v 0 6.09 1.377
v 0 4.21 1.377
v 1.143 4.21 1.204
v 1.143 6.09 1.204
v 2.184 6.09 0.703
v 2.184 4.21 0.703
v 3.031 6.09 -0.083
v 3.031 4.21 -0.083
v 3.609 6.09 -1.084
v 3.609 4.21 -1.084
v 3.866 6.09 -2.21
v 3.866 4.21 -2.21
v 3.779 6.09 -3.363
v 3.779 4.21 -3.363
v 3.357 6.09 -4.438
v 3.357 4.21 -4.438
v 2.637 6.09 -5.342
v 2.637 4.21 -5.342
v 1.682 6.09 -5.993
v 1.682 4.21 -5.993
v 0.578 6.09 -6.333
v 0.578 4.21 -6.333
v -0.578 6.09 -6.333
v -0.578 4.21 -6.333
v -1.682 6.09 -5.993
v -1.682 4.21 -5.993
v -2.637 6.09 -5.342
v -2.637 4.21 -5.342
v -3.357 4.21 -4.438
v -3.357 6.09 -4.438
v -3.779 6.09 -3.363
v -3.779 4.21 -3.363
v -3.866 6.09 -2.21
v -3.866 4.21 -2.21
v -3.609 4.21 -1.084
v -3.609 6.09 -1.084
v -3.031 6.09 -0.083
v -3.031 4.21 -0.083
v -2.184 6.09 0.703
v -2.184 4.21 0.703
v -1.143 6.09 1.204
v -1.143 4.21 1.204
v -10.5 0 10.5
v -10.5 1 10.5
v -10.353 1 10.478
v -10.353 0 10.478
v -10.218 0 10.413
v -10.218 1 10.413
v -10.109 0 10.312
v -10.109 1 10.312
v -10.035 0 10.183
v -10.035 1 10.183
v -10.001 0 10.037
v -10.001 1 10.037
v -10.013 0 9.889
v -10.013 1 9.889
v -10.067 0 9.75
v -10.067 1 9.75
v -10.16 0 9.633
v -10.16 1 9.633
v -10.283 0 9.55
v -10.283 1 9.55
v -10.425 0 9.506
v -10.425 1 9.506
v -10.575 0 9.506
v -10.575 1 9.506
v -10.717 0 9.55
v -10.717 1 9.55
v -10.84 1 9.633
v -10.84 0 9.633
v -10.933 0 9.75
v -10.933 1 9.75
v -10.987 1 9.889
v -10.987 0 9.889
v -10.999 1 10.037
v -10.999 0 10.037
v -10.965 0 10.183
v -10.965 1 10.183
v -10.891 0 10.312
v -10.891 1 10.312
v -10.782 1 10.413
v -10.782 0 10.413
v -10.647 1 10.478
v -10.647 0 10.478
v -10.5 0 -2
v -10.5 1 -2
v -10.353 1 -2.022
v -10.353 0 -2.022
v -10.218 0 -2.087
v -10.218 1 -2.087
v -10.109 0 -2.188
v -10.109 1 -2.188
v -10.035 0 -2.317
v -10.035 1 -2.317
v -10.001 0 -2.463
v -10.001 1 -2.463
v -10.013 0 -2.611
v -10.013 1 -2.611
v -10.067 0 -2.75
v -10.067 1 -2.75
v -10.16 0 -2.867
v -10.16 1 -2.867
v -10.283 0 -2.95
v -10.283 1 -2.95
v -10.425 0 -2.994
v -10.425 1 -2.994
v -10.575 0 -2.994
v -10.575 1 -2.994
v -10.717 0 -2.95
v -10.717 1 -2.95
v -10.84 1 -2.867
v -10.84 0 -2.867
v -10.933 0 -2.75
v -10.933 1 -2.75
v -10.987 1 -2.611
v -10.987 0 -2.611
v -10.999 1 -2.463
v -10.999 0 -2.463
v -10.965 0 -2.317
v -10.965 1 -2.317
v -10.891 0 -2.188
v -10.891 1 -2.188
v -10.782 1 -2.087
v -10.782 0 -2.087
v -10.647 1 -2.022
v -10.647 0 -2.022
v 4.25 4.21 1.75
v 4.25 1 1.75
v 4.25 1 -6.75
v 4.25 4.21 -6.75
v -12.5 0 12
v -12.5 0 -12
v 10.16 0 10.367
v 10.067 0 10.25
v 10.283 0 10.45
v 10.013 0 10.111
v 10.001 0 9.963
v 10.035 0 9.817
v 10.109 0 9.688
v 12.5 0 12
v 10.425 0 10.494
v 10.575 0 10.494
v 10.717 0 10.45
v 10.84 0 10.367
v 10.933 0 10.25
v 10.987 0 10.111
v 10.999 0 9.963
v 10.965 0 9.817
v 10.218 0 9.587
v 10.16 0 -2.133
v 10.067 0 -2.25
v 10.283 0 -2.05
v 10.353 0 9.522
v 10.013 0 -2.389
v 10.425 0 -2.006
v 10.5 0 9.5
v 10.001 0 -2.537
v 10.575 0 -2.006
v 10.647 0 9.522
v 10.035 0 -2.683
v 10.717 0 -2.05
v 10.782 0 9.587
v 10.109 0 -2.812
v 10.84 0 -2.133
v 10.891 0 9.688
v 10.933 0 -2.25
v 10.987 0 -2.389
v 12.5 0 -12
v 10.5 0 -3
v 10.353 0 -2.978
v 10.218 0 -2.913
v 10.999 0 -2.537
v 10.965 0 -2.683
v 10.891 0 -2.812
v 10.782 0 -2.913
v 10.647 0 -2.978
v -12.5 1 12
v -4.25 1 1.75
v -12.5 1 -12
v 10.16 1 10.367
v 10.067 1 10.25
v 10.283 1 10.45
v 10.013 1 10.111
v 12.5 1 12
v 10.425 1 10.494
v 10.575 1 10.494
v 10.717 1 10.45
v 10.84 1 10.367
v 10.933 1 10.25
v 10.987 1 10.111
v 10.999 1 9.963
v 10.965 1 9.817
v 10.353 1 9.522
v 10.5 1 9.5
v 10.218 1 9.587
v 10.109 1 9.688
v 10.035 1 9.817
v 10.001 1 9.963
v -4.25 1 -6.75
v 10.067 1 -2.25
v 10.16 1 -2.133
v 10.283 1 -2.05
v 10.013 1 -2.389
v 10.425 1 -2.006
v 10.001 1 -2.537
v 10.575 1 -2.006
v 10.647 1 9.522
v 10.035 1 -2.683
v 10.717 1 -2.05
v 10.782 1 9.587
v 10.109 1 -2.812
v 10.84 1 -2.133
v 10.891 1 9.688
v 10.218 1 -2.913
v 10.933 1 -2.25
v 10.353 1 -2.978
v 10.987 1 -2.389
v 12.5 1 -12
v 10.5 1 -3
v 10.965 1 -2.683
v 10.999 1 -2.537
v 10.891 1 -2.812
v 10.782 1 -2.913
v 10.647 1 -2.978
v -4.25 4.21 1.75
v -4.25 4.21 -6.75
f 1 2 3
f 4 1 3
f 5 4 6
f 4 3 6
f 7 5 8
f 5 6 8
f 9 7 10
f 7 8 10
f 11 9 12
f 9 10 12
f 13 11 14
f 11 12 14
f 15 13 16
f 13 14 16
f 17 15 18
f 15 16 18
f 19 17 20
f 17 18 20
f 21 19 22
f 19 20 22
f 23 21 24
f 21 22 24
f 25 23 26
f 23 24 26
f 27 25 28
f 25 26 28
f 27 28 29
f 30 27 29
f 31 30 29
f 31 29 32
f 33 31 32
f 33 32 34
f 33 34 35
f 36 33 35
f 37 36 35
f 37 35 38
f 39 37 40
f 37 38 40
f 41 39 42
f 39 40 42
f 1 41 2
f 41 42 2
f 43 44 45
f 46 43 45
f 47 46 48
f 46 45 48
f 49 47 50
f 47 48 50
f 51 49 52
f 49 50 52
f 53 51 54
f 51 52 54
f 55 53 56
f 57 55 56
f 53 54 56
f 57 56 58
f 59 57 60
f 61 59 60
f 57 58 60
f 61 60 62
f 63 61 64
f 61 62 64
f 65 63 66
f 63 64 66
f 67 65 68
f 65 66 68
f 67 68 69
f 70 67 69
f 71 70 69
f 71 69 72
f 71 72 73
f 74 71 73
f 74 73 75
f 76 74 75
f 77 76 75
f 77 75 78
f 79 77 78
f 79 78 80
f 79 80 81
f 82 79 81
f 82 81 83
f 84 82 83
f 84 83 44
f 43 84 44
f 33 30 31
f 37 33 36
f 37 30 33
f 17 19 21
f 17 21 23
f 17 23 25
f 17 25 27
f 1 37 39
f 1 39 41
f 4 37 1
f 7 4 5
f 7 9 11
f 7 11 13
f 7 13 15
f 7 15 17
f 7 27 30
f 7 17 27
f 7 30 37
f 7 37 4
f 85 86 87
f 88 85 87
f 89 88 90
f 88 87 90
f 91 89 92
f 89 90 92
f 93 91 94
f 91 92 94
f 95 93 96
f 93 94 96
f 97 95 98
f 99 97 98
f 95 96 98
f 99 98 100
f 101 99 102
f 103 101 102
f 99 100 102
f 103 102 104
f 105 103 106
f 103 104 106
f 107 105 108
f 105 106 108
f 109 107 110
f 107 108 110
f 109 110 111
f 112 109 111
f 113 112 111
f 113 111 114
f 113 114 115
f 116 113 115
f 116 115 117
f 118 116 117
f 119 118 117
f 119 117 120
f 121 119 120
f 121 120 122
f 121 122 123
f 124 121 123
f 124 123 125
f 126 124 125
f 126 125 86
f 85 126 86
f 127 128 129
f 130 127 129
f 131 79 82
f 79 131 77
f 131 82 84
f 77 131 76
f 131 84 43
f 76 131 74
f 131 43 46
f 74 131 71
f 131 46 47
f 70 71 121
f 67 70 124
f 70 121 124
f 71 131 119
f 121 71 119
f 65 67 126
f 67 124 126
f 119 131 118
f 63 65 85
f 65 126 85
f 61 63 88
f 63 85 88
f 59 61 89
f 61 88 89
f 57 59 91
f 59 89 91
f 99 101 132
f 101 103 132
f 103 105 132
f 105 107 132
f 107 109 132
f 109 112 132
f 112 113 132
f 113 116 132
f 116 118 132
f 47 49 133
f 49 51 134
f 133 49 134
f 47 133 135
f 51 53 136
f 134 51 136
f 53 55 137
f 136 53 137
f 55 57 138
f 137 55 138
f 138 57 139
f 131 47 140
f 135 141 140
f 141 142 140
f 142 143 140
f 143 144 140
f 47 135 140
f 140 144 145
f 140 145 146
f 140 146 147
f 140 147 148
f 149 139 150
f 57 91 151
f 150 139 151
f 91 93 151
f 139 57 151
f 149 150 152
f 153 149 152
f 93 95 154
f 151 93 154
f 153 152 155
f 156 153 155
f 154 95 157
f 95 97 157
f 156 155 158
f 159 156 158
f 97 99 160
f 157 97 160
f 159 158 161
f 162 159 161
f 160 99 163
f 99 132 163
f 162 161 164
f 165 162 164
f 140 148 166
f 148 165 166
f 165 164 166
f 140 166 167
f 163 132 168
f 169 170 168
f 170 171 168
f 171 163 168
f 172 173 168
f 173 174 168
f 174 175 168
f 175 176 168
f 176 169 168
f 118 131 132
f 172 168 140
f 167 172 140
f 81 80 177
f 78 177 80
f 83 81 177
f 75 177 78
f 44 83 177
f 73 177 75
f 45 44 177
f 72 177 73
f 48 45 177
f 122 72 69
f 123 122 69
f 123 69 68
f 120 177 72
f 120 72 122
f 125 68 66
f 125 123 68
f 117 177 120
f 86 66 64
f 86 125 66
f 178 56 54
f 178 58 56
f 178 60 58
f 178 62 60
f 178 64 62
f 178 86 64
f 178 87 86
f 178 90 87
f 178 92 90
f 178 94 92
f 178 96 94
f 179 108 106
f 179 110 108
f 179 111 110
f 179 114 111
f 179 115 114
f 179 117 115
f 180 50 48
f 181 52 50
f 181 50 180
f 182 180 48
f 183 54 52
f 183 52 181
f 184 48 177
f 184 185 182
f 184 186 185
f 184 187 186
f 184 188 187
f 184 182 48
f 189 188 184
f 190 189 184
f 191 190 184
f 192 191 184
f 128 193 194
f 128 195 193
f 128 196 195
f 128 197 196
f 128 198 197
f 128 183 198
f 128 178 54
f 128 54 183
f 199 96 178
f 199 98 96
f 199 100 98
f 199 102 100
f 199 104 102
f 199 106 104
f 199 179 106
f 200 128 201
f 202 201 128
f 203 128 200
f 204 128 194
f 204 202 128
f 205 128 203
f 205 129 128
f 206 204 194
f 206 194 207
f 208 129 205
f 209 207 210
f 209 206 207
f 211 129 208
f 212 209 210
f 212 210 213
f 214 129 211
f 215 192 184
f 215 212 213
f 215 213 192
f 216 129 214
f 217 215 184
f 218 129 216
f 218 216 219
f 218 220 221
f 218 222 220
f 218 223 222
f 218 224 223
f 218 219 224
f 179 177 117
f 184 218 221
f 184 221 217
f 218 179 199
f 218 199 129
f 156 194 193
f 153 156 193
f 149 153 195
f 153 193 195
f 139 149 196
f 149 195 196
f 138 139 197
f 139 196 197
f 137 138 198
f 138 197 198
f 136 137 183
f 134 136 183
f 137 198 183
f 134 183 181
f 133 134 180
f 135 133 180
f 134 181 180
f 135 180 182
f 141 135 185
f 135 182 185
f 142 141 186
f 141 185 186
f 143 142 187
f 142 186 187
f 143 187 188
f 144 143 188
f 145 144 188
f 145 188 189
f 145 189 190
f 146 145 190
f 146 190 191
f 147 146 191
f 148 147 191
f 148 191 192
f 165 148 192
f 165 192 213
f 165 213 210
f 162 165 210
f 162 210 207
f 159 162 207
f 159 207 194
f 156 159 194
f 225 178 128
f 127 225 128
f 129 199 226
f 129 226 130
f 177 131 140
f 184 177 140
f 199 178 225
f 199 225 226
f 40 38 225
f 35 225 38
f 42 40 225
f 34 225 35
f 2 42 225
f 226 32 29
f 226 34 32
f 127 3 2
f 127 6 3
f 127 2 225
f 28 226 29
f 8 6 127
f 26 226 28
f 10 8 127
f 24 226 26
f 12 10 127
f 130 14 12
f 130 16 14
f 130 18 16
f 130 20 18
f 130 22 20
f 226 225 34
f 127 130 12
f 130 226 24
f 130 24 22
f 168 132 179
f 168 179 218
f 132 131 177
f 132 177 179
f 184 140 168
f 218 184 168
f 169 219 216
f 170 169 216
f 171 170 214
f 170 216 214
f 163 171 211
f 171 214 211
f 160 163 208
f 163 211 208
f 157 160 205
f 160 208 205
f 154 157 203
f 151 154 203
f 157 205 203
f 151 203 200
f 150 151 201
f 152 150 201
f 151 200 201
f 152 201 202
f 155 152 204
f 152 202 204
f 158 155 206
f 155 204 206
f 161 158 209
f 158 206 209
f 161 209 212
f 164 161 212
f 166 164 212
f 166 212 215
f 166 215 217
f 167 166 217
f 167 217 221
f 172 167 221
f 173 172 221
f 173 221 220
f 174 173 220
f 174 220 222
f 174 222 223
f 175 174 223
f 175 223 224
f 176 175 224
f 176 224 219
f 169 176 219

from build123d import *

# Parameters (mm, degrees)
SKETCH1_W           = 25
SKETCH1_H           = 24
BOSS_EXTRUDE1_DEPTH = 1
SKETCH2_R           = 0.5
CUT_EXTRUDE1_DEPTH  = 18.356554958
SKETCH3_W           = 8.5
SKETCH3_H           = 8.5
BOSS_EXTRUDE2_DEPTH = 3.21
SKETCH4_R           = 3.876557288
BOSS_EXTRUDE3_DEPTH = 1.88


with BuildPart() as part:
    # Sketch1 → Boss-Extrude1 (new body)
    with BuildSketch(Plane(origin=(0, 0, 0), x_dir=(1, 0, 0), z_dir=(0, 1, 0))):
        Rectangle(SKETCH1_W, SKETCH1_H)
    extrude(amount=BOSS_EXTRUDE1_DEPTH)

    # Sketch2 → Cut-Extrude1 (cut, through all)
    with BuildSketch(Plane(origin=(0, 1, 0), x_dir=(1, 0, 0), z_dir=(0, 1, 0))):
        with Locations(Location((-10.5, -10, 0), (0, 0, 270))):
            Circle(SKETCH2_R)
        with Locations(Location((10.5, -10, 0), (0, 0, 90))):
            Circle(SKETCH2_R)
        with Locations(Location((-10.5, 2.5, 0), (0, 0, 270))):
            Circle(SKETCH2_R)
        with Locations(Location((10.5, 2.5, 0), (0, 0, 90))):
            Circle(SKETCH2_R)
    extrude(amount=-CUT_EXTRUDE1_DEPTH, mode=Mode.SUBTRACT)

    # Sketch3 → Boss-Extrude2 (add)
    with BuildSketch(Plane(origin=(0, 1, 0), x_dir=(1, 0, 0), z_dir=(0, 1, 0))):
        with Locations((0, 2.5)):
            Rectangle(SKETCH3_W, SKETCH3_H)
    extrude(amount=BOSS_EXTRUDE2_DEPTH)

    # Sketch4 → Boss-Extrude3 (add)
    with BuildSketch(Plane(origin=(0, 4.21, 0), x_dir=(1, 0, 0), z_dir=(0, 1, 0))):
        with Locations(Location((0, 2.5, 0), (0, 0, 270))):
            Circle(SKETCH4_R)
    extrude(amount=BOSS_EXTRUDE3_DEPTH)


solid = part.part
